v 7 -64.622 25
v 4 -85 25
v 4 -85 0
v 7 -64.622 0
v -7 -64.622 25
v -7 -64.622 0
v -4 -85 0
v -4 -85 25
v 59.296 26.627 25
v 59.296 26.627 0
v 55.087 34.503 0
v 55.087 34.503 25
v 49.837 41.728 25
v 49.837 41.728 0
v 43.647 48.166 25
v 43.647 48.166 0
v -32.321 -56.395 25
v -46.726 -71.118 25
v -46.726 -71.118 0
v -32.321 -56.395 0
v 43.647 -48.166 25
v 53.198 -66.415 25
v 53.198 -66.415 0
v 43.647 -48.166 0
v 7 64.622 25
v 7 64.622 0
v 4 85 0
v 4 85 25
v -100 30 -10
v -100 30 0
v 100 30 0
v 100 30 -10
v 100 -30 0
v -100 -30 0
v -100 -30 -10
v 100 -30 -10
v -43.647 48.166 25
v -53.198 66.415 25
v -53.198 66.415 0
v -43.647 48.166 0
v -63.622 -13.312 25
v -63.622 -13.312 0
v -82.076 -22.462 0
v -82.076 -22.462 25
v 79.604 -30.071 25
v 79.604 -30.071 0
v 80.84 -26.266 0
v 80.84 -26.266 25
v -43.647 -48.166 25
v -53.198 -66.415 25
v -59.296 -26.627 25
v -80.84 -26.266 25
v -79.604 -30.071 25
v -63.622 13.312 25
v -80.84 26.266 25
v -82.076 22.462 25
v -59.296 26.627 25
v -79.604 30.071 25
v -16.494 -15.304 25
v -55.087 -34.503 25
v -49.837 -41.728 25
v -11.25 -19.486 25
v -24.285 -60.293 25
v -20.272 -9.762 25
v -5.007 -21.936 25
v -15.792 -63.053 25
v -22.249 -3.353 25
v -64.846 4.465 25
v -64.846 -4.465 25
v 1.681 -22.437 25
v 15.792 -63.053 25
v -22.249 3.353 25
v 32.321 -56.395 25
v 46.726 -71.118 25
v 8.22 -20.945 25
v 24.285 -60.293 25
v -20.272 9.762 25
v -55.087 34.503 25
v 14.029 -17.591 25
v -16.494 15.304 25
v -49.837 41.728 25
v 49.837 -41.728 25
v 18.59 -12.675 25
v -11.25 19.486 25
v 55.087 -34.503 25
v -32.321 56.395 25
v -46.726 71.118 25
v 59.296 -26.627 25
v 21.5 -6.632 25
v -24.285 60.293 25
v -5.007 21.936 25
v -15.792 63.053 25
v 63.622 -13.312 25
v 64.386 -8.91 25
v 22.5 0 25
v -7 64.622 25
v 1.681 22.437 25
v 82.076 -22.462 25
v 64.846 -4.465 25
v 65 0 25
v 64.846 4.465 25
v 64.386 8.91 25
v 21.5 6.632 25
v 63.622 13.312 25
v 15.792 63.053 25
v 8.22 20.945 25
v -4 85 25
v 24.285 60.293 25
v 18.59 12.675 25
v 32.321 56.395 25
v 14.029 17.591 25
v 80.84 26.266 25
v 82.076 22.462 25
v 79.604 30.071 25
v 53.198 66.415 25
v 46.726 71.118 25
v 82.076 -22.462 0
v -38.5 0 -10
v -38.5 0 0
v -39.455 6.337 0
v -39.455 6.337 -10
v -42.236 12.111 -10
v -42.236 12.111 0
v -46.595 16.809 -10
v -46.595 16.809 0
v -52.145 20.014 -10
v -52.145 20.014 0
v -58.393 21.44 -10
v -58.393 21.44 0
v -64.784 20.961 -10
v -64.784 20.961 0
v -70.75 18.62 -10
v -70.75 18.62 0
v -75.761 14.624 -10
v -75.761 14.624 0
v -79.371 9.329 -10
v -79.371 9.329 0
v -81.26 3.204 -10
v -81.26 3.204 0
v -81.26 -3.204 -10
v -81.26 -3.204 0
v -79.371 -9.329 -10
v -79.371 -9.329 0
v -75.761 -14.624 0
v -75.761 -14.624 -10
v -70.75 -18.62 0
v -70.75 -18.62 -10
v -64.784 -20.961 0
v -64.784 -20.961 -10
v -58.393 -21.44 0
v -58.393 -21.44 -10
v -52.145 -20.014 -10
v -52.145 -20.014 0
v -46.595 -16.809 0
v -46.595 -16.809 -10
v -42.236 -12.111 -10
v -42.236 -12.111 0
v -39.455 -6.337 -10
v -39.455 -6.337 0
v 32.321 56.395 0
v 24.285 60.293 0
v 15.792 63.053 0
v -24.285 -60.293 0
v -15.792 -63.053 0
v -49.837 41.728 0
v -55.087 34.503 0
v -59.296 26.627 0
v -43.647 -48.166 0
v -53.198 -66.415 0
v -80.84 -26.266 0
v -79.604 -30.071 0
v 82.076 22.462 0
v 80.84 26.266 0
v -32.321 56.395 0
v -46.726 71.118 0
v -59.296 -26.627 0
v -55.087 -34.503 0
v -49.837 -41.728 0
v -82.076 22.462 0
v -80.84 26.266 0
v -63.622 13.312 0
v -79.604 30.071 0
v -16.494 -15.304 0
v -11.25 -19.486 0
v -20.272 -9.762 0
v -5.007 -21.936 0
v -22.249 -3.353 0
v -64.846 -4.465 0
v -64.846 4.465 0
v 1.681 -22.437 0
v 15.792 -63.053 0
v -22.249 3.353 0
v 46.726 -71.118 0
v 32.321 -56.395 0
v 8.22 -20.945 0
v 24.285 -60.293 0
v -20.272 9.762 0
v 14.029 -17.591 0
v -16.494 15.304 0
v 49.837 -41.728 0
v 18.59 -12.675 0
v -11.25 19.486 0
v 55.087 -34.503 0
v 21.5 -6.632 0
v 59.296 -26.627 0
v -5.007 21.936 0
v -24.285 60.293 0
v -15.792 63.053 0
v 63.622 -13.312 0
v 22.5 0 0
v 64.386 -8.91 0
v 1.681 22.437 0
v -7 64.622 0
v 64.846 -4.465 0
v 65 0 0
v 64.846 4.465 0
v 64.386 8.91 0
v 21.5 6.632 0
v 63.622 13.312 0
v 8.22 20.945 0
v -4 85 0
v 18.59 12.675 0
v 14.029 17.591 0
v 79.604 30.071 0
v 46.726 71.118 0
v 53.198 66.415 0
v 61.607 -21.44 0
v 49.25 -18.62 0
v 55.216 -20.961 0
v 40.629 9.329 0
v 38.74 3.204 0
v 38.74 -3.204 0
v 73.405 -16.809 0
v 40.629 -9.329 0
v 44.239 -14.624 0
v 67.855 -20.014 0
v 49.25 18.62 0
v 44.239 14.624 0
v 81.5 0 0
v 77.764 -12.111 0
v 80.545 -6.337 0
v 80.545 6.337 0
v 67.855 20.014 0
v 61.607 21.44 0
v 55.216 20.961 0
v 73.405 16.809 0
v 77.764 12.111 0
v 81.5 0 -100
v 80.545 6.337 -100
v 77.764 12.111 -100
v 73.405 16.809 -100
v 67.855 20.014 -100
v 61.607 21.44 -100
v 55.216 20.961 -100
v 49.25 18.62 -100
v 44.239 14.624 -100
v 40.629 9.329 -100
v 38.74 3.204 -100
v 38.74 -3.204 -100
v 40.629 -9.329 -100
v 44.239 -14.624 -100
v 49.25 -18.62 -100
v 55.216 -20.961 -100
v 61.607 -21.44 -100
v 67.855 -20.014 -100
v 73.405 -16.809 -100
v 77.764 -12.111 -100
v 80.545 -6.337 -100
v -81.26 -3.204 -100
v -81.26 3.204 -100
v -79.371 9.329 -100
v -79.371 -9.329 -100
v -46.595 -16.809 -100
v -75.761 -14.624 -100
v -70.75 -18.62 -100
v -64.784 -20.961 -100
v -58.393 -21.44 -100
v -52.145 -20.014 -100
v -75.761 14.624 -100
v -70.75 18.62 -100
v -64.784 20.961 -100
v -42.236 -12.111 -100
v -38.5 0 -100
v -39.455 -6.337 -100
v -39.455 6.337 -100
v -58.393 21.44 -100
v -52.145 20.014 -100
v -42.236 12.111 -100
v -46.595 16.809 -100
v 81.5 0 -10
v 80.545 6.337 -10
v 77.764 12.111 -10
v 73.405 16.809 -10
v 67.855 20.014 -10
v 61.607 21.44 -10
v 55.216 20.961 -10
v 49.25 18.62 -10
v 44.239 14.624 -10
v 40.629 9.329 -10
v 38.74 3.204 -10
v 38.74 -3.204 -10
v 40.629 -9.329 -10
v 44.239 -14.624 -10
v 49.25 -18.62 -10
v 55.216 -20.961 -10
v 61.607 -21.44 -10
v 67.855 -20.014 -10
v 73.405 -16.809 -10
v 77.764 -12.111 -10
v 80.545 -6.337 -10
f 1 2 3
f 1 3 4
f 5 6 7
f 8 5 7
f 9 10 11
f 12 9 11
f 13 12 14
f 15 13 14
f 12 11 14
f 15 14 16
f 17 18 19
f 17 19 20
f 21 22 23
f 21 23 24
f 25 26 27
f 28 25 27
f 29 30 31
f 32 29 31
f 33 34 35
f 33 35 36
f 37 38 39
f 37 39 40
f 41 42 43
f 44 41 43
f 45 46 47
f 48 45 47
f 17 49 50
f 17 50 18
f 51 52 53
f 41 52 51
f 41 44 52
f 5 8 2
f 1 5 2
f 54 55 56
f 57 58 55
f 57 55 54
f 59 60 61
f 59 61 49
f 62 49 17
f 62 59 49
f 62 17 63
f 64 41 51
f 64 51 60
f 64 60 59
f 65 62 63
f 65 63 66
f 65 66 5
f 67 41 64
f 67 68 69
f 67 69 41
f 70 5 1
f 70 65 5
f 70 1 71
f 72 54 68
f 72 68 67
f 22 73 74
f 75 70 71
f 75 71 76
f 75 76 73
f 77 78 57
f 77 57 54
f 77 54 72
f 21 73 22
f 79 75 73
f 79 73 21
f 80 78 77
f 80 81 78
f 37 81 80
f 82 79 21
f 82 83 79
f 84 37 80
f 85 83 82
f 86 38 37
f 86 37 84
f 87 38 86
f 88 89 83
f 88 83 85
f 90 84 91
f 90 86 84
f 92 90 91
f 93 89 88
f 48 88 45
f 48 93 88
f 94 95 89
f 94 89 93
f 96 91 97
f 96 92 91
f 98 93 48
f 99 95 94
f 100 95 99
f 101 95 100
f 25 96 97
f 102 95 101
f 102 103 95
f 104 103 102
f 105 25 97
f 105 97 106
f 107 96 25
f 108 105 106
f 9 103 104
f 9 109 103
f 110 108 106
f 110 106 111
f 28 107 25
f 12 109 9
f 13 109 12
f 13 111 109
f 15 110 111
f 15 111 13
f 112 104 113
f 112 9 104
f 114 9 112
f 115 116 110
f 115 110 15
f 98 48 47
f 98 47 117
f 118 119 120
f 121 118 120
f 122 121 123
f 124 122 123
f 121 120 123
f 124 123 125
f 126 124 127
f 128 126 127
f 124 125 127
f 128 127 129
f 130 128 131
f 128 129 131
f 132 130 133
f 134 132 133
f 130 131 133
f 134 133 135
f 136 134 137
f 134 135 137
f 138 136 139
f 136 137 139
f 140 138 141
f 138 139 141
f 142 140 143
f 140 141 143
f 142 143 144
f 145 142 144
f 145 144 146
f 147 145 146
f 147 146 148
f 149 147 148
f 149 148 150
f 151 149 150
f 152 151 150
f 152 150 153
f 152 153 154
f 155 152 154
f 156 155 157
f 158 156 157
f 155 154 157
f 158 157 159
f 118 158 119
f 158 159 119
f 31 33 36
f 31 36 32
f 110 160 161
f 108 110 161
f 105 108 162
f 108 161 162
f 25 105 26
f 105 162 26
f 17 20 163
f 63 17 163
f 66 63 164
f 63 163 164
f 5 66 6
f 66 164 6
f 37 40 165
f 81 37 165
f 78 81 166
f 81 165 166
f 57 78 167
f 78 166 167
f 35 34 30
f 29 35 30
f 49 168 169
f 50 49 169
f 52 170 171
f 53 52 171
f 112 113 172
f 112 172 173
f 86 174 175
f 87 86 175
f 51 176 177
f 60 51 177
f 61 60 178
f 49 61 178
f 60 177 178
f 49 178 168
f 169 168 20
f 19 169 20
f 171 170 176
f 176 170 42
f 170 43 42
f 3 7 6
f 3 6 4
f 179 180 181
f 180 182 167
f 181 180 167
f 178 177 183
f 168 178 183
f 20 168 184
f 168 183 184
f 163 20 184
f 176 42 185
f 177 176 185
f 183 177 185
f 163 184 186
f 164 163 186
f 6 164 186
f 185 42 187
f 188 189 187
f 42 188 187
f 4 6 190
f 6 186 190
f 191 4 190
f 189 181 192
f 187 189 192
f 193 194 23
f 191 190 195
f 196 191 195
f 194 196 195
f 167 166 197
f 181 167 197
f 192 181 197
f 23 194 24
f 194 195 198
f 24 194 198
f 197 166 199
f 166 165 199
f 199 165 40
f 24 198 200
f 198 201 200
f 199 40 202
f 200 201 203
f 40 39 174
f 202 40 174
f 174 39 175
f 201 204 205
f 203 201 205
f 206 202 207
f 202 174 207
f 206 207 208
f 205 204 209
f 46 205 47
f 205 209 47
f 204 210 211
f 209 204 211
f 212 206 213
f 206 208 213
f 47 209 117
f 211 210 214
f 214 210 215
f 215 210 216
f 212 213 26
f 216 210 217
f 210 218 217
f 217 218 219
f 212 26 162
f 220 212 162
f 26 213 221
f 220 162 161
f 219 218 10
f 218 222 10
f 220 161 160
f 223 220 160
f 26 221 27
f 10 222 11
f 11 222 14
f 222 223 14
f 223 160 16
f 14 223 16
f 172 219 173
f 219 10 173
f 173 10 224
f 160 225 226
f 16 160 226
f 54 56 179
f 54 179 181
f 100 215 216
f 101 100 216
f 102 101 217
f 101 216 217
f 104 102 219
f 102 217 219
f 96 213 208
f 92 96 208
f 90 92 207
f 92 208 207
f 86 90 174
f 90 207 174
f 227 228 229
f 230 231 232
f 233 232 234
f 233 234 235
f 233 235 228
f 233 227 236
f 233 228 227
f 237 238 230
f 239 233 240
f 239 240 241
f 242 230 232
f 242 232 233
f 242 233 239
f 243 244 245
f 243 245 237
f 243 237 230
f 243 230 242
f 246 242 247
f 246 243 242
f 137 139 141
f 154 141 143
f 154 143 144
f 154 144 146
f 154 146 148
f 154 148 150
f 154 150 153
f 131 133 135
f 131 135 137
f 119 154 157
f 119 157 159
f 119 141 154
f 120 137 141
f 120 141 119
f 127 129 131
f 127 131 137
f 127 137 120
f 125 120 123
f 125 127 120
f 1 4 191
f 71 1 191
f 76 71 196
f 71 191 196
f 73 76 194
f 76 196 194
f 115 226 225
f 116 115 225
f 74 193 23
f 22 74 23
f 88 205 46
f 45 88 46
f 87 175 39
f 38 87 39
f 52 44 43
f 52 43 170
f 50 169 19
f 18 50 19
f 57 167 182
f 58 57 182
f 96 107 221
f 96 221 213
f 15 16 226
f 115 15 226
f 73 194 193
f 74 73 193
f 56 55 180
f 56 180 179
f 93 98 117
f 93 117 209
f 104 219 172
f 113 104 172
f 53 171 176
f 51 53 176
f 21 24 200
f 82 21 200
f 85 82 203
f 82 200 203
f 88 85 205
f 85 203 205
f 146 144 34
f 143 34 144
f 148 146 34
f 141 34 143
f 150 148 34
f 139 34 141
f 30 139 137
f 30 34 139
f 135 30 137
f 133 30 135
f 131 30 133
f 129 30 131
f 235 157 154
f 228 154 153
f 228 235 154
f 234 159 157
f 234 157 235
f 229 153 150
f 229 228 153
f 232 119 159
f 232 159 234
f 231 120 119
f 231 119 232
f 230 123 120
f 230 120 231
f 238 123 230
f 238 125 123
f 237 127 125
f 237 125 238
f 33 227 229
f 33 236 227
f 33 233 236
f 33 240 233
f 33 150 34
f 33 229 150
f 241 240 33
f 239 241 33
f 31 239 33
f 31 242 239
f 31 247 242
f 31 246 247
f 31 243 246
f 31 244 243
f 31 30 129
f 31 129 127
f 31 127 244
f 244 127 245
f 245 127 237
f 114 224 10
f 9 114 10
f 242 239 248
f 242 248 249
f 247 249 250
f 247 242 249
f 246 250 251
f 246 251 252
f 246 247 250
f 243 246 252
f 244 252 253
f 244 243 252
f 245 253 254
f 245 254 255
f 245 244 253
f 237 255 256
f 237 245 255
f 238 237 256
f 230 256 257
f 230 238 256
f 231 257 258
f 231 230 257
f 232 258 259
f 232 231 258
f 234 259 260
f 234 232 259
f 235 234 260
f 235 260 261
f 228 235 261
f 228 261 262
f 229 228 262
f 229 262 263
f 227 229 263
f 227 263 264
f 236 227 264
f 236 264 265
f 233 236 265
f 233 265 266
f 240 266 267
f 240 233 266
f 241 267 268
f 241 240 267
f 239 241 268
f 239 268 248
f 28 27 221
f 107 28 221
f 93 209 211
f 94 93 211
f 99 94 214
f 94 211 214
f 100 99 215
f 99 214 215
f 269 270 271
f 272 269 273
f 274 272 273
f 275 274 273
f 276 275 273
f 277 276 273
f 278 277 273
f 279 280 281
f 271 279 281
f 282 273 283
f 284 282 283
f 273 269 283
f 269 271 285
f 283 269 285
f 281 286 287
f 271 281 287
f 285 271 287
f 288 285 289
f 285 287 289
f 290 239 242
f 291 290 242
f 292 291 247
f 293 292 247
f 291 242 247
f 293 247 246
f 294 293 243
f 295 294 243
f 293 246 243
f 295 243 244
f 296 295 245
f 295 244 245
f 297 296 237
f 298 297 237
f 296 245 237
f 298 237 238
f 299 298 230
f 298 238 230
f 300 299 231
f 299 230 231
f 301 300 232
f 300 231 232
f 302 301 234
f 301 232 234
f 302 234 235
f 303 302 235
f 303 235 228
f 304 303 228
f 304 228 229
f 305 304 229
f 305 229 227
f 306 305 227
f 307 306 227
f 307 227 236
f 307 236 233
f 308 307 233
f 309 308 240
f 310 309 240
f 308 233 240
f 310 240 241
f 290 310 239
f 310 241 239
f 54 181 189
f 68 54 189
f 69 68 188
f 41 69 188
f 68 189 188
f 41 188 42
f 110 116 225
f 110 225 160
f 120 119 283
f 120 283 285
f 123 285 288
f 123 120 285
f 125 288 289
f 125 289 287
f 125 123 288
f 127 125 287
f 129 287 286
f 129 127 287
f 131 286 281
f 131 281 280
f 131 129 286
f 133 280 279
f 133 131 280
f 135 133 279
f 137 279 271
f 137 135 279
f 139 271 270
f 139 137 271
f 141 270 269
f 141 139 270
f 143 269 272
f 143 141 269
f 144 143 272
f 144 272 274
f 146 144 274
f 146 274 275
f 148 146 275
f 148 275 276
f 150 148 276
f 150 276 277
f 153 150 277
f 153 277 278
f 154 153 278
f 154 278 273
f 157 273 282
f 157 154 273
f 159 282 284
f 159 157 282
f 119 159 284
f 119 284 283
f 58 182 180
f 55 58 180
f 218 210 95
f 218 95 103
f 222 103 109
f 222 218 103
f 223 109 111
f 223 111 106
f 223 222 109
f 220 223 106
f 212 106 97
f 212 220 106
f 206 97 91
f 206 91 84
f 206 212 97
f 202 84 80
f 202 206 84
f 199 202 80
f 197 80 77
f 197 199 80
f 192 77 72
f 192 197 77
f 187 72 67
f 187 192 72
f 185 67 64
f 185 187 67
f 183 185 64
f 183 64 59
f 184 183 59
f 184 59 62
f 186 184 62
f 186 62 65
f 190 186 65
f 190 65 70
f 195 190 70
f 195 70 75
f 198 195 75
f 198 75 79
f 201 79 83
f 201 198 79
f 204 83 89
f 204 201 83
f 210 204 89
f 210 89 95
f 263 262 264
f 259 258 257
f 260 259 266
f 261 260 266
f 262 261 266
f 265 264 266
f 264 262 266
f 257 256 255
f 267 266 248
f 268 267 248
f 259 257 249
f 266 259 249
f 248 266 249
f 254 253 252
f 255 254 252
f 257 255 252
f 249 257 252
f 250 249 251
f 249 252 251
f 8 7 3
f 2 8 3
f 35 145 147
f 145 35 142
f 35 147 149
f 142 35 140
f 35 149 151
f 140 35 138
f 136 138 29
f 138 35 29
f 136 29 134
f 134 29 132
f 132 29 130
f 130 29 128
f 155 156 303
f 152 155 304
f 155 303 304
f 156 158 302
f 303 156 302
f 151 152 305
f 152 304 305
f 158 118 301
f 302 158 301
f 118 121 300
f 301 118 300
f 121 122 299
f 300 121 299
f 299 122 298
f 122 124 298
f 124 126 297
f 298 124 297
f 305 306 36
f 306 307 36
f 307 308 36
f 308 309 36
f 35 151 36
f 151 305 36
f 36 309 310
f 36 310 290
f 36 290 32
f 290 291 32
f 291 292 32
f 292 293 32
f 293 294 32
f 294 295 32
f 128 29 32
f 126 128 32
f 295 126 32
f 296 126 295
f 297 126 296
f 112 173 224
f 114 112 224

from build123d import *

# Parameters (mm, degrees)
F0_R     = 22.5
F1_DEPTH = 25
F4_R     = 21.5
F5_DEPTH = 100
F4_W     = 200
F4_H     = 60
F6_DEPTH = 10


with BuildPart() as f1:
    # F0 (on Top) → F1 (new body)
    with BuildSketch(Plane.XY):
        with BuildLine():
            ThreePointArc((63.622272, -13.311894), (64.654651, -6.691499), (65, 0))
            ThreePointArc((65, 0), (64.654651, 6.691499), (63.622272, 13.311894))
            ThreePointArc((63.622272, 13.311894), (61.818674, 20.086105), (59.296034, 26.626685))
            ThreePointArc((59.296034, 26.626685), (52.586105, 38.206041), (43.646964, 48.165781))
            ThreePointArc((43.646964, 48.165781), (38.206041, 52.586105), (32.320726, 56.394775))
            ThreePointArc((32.320726, 56.394775), (20.086105, 61.818674), (7, 64.621978))
            ThreePointArc((7, 64.621978), (0, 65), (-7, 64.621978))
            ThreePointArc((-7, 64.621978), (-20.086105, 61.818674), (-32.320726, 56.394775))
            ThreePointArc((-32.320726, 56.394775), (-38.206041, 52.586105), (-43.646964, 48.165781))
            ThreePointArc((-43.646964, 48.165781), (-52.586105, 38.206041), (-59.296034, 26.626685))
            ThreePointArc((-59.296034, 26.626685), (-61.818674, 20.086105), (-63.622272, 13.311894))
            ThreePointArc((-63.622272, 13.311894), (-65, 0), (-63.622272, -13.311894))
            ThreePointArc((-63.622272, -13.311894), (-61.818674, -20.086105), (-59.296034, -26.626685))
            ThreePointArc((-59.296034, -26.626685), (-52.586105, -38.206041), (-43.646964, -48.165781))
            ThreePointArc((-43.646964, -48.165781), (-38.206041, -52.586105), (-32.320726, -56.394775))
            ThreePointArc((-32.320726, -56.394775), (-20.086105, -61.818674), (-7, -64.621978))
            ThreePointArc((-7, -64.621978), (0, -65), (7, -64.621978))
            ThreePointArc((7, -64.621978), (20.086105, -61.818674), (32.320726, -56.394775))
            ThreePointArc((32.320726, -56.394775), (38.206041, -52.586105), (43.646964, -48.165781))
            ThreePointArc((43.646964, -48.165781), (52.586105, -38.206041), (59.296034, -26.626685))
            ThreePointArc((59.296034, -26.626685), (61.818674, -20.086105), (63.622272, -13.311894))
        make_face()
        Circle(F0_R, mode=Mode.SUBTRACT)
        with BuildLine():
            Line((53.197814, -66.415304), (43.646964, -48.165781))
            ThreePointArc((43.646964, -48.165781), (38.206041, -52.586105), (32.320726, -56.394775))
            Line((32.320726, -56.394775), (46.725678, -71.117586))
            Line((46.725678, -71.117586), (49.961746, -68.766445))
            Line((49.961746, -68.766445), (53.197814, -66.415304))
        make_face()
        with BuildLine():
            Line((82.075872, -22.462218), (63.622272, -13.311894))
            ThreePointArc((63.622272, -13.311894), (61.818674, -20.086105), (59.296034, -26.626685))
            Line((59.296034, -26.626685), (79.603736, -30.070671))
            Line((79.603736, -30.070671), (80.839804, -26.266445))
            Line((80.839804, -26.266445), (82.075872, -22.462218))
        make_face()
        with BuildLine():
            ThreePointArc((59.296034, 26.626685), (61.818674, 20.086105), (63.622272, 13.311894))
            Line((63.622272, 13.311894), (82.075872, 22.462218))
            Line((82.075872, 22.462218), (80.839804, 26.266445))
            Line((80.839804, 26.266445), (79.603736, 30.070671))
            Line((79.603736, 30.070671), (59.296034, 26.626685))
        make_face()
        with BuildLine():
            ThreePointArc((32.320726, 56.394775), (38.206041, 52.586105), (43.646964, 48.165781))
            Line((43.646964, 48.165781), (53.197814, 66.415304))
            Line((53.197814, 66.415304), (49.961746, 68.766445))
            Line((49.961746, 68.766445), (46.725678, 71.117586))
            Line((46.725678, 71.117586), (32.320726, 56.394775))
        make_face()
        with BuildLine():
            ThreePointArc((-7, 64.621978), (0, 65), (7, 64.621978))
            Line((7, 64.621978), (4, 85))
            Line((4, 85), (0, 85))
            Line((0, 85), (-4, 85))
            Line((-4, 85), (-7, 64.621978))
        make_face()
        with BuildLine():
            ThreePointArc((-43.646964, 48.165781), (-38.206041, 52.586105), (-32.320726, 56.394775))
            Line((-32.320726, 56.394775), (-46.725678, 71.117586))
            Line((-46.725678, 71.117586), (-49.961746, 68.766445))
            Line((-49.961746, 68.766445), (-53.197814, 66.415304))
            Line((-53.197814, 66.415304), (-43.646964, 48.165781))
        make_face()
        with BuildLine():
            ThreePointArc((-63.622272, 13.311894), (-61.818674, 20.086105), (-59.296034, 26.626685))
            Line((-59.296034, 26.626685), (-79.603736, 30.070671))
            Line((-79.603736, 30.070671), (-80.839804, 26.266445))
            Line((-80.839804, 26.266445), (-82.075872, 22.462218))
            Line((-82.075872, 22.462218), (-63.622272, 13.311894))
        make_face()
        with BuildLine():
            Line((-79.603736, -30.070671), (-59.296034, -26.626685))
            ThreePointArc((-59.296034, -26.626685), (-61.818674, -20.086105), (-63.622272, -13.311894))
            Line((-63.622272, -13.311894), (-82.075872, -22.462218))
            Line((-82.075872, -22.462218), (-80.839804, -26.266445))
            Line((-80.839804, -26.266445), (-79.603736, -30.070671))
        make_face()
        with BuildLine():
            Line((-46.725678, -71.117586), (-32.320726, -56.394775))
            ThreePointArc((-32.320726, -56.394775), (-38.206041, -52.586105), (-43.646964, -48.165781))
            Line((-43.646964, -48.165781), (-53.197814, -66.415304))
            Line((-53.197814, -66.415304), (-49.961746, -68.766445))
            Line((-49.961746, -68.766445), (-46.725678, -71.117586))
        make_face()
        with BuildLine():
            Line((4, -85), (7, -64.621978))
            ThreePointArc((7, -64.621978), (0, -65), (-7, -64.621978))
            Line((-7, -64.621978), (-4, -85))
            Line((-4, -85), (0, -85))
            Line((0, -85), (4, -85))
        make_face()
    extrude(amount=F1_DEPTH)


with BuildPart() as f2_1:
    # F2: copy of F1
    add(f1.part)


with BuildPart() as f5:
    # F4 (on Top) → F5 (new body)
    with BuildSketch(Plane.XY):
        with Locations((-60, 0)):
            Circle(F4_R)
        with Locations((60, 0)):
            Circle(F4_R)
    extrude(amount=-F5_DEPTH)


with BuildPart() as f6:
    # F4 (on Top) → F6 (new body)
    with BuildSketch(Plane.XY):
        Rectangle(F4_W, F4_H)
        with Locations((-60, 0)):
            Circle(F4_R, mode=Mode.SUBTRACT)
        with Locations((60, 0)):
            Circle(F4_R, mode=Mode.SUBTRACT)
    extrude(amount=-F6_DEPTH)


solid = Compound([f1.part, f5.part, f6.part])
